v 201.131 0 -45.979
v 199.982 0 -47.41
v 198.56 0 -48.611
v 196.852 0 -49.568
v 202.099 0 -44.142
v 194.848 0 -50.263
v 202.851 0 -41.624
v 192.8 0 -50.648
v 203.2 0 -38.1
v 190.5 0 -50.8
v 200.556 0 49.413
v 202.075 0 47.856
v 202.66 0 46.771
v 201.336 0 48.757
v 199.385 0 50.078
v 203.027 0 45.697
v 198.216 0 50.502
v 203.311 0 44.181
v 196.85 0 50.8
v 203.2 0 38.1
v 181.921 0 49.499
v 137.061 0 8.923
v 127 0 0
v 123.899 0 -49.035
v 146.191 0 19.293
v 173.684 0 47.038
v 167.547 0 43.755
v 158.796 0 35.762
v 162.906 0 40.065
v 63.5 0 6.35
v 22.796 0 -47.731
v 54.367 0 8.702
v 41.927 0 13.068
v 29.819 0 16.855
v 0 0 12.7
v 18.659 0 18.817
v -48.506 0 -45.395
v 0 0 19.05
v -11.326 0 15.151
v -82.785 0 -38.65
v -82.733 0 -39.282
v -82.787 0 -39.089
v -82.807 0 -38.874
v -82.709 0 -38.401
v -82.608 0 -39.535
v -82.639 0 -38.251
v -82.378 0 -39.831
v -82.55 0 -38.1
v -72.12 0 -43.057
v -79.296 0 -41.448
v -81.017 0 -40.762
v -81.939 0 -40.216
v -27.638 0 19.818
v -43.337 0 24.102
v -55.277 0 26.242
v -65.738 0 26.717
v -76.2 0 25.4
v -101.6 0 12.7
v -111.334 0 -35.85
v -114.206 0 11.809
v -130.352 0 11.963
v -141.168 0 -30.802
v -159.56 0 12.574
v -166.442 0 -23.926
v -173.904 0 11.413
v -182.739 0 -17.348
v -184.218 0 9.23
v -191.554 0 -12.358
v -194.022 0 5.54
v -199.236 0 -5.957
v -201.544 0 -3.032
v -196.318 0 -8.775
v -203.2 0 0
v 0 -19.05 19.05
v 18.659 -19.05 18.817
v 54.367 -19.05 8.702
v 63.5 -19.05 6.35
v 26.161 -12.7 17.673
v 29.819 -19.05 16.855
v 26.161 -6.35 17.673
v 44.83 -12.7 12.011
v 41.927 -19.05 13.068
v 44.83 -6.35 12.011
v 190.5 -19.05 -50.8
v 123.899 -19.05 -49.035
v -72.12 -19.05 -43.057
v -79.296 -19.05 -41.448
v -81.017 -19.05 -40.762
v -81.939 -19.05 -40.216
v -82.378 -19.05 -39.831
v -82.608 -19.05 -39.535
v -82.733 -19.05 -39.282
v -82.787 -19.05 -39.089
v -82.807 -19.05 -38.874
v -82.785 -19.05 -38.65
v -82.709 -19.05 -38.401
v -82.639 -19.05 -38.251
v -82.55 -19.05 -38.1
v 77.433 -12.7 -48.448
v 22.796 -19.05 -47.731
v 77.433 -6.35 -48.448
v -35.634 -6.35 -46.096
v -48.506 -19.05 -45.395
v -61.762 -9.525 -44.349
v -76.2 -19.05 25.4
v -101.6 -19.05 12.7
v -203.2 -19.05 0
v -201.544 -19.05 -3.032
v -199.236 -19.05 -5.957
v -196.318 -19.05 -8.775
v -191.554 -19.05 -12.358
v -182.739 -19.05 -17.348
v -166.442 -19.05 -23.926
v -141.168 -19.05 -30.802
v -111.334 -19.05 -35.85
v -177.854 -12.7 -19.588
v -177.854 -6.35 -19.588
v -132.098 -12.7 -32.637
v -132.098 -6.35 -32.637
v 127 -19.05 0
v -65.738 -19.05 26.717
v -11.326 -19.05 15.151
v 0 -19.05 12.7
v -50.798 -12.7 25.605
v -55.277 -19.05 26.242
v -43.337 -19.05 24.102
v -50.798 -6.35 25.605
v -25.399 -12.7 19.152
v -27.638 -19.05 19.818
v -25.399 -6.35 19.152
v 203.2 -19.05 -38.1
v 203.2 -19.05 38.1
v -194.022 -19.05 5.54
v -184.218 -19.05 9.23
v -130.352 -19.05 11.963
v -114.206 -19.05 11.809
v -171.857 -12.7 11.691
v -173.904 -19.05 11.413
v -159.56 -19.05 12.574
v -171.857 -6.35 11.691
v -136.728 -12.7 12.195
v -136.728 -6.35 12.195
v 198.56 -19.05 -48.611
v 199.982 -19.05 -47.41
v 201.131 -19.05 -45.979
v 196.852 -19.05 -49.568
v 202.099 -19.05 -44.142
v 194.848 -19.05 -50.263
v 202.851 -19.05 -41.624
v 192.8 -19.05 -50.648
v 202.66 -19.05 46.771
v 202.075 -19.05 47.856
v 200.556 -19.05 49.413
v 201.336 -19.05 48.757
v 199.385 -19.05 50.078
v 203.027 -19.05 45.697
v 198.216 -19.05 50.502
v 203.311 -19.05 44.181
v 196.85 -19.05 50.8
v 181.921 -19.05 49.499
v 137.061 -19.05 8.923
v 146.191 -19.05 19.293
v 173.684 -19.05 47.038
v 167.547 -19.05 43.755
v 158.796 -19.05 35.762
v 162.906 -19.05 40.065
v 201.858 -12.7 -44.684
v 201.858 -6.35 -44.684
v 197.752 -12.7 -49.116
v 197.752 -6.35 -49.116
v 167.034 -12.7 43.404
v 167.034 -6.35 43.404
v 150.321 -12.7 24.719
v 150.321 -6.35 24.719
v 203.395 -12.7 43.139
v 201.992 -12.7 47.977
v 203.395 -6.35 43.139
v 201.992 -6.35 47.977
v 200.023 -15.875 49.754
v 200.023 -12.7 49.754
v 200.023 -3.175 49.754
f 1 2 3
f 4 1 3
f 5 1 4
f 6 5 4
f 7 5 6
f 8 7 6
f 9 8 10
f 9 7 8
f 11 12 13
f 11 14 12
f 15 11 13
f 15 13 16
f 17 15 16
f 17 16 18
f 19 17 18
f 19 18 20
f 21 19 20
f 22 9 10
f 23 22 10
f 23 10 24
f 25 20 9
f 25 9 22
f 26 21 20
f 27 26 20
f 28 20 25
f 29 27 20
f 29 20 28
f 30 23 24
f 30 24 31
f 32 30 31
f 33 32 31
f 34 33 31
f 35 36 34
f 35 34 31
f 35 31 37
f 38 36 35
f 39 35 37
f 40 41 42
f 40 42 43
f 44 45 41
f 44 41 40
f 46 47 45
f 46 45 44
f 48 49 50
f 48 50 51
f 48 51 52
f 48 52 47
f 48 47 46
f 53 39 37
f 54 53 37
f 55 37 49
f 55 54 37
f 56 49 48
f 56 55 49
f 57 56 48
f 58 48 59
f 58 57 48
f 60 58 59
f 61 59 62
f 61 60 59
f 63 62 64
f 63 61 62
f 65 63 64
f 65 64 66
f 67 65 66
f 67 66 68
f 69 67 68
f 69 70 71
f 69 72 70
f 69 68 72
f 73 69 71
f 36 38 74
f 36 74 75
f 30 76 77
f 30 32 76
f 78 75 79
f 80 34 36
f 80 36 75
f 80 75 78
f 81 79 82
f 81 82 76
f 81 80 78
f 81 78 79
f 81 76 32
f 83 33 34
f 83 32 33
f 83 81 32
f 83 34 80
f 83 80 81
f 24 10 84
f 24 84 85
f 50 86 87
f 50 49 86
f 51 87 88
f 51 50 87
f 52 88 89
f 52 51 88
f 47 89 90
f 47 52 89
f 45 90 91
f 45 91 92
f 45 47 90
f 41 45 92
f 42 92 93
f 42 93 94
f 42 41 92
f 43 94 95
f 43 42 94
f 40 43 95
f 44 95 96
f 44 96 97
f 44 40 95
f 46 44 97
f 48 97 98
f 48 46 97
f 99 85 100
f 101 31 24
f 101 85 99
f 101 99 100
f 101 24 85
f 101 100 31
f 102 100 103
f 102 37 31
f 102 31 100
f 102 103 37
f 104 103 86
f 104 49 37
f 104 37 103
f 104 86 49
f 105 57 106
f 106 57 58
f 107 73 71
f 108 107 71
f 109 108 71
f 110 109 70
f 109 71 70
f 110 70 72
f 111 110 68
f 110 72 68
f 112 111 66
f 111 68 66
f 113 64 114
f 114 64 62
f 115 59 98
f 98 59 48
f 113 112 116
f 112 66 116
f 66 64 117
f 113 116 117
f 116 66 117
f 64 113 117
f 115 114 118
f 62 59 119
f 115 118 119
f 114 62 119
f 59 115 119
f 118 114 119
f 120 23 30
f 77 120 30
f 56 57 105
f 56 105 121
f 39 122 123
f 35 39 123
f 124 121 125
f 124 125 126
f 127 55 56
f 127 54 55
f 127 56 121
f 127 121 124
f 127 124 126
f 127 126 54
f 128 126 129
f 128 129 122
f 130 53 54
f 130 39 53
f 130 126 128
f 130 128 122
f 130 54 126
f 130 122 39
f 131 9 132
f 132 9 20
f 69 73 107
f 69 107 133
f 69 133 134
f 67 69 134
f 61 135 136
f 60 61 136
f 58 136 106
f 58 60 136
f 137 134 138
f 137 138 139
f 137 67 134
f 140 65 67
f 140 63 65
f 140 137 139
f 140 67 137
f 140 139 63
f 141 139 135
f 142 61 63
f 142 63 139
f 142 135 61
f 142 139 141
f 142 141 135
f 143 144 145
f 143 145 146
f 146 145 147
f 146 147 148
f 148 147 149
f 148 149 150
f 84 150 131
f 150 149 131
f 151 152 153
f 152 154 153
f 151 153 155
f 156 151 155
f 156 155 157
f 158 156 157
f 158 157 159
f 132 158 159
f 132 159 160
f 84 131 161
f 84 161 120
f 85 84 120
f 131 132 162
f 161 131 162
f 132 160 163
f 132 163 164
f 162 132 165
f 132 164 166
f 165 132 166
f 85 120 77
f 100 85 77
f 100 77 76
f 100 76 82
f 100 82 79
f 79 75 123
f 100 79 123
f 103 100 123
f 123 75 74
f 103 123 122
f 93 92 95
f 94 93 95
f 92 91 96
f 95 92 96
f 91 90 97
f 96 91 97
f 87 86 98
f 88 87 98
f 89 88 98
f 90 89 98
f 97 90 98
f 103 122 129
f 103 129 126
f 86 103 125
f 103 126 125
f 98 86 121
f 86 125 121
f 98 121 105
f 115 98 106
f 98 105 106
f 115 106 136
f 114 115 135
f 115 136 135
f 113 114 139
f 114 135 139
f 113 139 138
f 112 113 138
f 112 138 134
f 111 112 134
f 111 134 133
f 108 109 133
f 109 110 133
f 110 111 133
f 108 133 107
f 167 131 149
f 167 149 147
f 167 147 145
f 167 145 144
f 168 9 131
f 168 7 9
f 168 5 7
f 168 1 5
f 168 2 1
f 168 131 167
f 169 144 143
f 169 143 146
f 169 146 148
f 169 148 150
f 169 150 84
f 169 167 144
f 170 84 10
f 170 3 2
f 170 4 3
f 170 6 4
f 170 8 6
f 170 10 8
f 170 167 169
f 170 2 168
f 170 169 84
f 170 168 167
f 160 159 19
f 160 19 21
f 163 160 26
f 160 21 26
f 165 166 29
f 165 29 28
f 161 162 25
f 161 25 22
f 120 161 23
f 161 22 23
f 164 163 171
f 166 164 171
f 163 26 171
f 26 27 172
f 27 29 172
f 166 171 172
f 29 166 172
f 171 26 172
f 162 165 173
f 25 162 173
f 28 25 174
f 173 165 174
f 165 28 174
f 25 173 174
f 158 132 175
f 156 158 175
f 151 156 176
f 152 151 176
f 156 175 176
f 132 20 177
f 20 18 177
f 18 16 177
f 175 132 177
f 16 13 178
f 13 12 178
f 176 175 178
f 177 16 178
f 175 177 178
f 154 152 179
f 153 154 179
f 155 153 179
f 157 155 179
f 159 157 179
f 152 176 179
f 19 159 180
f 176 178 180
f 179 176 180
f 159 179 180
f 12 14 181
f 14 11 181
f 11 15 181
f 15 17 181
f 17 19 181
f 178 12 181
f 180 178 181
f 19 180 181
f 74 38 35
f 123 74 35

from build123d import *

# Parameters (mm, degrees)
F1_DEPTH = 19.05


with BuildPart() as f1:
    # F0 (on Front) → F1 (new body)
    with BuildSketch(Plane.XZ):
        with BuildLine():
            add(Edge.make_bspline(
                [(-203.2, 0), (-175.011158, 21.012219), (-135.466667, 8.466667), (-101.6, 12.7)],
                knots=[0, 0, 0, 0, 102.390673, 102.390673, 102.390673, 102.390673], degree=3))
            add(Edge.make_bspline(
                [(-203.2, 0), (-193.597674, -22.507101), (-128.455162, -36.779895), (-82.55, -38.1)],
                knots=[0, 0, 0, 0, 126.522854, 126.522854, 126.522854, 126.522854], degree=3))
            add(Edge.make_bspline(
                [(190.5, -50.8), (99.483333, -46.566667), (-90.760343, -50.8), (-82.55, -38.1)],
                knots=[0, 0, 0, 0, 273.345189, 273.345189, 273.345189, 273.345189], degree=3))
            add(Edge.make_bspline(
                [(203.2, -38.1), (203.11287, -45.563158), (199.453175, -50.686721), (190.5, -50.8)],
                knots=[0, 0, 0, 0, 17.960512, 17.960512, 17.960512, 17.960512], degree=3))
            Line((203.2, -38.1), (203.2, 38.1))
            add(Edge.make_bspline(
                [(203.2, 38.1), (203.478828, 42.635404), (204.576746, 49.588814), (196.85, 50.8)],
                knots=[0, 0, 0, 0, 14.199032, 14.199032, 14.199032, 14.199032], degree=3))
            add(Edge.make_bspline(
                [(196.85, 50.8), (153.912932, 50.8), (160.194486, 25.984986), (127, 0)],
                knots=[0, 0, 0, 0, 86.369338, 86.369338, 86.369338, 86.369338], degree=3))
            Line((127, 0), (63.5, 6.35))
            add(Edge.make_bspline(
                [(0, 19.05), (32.403201, 21.242376), (42.333333, 10.583333), (63.5, 6.35)],
                knots=[0, 0, 0, 0, 64.757548, 64.757548, 64.757548, 64.757548], degree=3))
            Line((0, 19.05), (0, 12.7))
            add(Edge.make_bspline(
                [(-76.2, 25.4), (-50.794795, 31.152328), (-25.4, 16.933333), (0, 12.7)],
                knots=[0, 0, 0, 0, 77.251084, 77.251084, 77.251084, 77.251084], degree=3))
            Line((-76.2, 25.4), (-101.6, 12.7))
        make_face()
    extrude(amount=F1_DEPTH)


solid = f1.part
